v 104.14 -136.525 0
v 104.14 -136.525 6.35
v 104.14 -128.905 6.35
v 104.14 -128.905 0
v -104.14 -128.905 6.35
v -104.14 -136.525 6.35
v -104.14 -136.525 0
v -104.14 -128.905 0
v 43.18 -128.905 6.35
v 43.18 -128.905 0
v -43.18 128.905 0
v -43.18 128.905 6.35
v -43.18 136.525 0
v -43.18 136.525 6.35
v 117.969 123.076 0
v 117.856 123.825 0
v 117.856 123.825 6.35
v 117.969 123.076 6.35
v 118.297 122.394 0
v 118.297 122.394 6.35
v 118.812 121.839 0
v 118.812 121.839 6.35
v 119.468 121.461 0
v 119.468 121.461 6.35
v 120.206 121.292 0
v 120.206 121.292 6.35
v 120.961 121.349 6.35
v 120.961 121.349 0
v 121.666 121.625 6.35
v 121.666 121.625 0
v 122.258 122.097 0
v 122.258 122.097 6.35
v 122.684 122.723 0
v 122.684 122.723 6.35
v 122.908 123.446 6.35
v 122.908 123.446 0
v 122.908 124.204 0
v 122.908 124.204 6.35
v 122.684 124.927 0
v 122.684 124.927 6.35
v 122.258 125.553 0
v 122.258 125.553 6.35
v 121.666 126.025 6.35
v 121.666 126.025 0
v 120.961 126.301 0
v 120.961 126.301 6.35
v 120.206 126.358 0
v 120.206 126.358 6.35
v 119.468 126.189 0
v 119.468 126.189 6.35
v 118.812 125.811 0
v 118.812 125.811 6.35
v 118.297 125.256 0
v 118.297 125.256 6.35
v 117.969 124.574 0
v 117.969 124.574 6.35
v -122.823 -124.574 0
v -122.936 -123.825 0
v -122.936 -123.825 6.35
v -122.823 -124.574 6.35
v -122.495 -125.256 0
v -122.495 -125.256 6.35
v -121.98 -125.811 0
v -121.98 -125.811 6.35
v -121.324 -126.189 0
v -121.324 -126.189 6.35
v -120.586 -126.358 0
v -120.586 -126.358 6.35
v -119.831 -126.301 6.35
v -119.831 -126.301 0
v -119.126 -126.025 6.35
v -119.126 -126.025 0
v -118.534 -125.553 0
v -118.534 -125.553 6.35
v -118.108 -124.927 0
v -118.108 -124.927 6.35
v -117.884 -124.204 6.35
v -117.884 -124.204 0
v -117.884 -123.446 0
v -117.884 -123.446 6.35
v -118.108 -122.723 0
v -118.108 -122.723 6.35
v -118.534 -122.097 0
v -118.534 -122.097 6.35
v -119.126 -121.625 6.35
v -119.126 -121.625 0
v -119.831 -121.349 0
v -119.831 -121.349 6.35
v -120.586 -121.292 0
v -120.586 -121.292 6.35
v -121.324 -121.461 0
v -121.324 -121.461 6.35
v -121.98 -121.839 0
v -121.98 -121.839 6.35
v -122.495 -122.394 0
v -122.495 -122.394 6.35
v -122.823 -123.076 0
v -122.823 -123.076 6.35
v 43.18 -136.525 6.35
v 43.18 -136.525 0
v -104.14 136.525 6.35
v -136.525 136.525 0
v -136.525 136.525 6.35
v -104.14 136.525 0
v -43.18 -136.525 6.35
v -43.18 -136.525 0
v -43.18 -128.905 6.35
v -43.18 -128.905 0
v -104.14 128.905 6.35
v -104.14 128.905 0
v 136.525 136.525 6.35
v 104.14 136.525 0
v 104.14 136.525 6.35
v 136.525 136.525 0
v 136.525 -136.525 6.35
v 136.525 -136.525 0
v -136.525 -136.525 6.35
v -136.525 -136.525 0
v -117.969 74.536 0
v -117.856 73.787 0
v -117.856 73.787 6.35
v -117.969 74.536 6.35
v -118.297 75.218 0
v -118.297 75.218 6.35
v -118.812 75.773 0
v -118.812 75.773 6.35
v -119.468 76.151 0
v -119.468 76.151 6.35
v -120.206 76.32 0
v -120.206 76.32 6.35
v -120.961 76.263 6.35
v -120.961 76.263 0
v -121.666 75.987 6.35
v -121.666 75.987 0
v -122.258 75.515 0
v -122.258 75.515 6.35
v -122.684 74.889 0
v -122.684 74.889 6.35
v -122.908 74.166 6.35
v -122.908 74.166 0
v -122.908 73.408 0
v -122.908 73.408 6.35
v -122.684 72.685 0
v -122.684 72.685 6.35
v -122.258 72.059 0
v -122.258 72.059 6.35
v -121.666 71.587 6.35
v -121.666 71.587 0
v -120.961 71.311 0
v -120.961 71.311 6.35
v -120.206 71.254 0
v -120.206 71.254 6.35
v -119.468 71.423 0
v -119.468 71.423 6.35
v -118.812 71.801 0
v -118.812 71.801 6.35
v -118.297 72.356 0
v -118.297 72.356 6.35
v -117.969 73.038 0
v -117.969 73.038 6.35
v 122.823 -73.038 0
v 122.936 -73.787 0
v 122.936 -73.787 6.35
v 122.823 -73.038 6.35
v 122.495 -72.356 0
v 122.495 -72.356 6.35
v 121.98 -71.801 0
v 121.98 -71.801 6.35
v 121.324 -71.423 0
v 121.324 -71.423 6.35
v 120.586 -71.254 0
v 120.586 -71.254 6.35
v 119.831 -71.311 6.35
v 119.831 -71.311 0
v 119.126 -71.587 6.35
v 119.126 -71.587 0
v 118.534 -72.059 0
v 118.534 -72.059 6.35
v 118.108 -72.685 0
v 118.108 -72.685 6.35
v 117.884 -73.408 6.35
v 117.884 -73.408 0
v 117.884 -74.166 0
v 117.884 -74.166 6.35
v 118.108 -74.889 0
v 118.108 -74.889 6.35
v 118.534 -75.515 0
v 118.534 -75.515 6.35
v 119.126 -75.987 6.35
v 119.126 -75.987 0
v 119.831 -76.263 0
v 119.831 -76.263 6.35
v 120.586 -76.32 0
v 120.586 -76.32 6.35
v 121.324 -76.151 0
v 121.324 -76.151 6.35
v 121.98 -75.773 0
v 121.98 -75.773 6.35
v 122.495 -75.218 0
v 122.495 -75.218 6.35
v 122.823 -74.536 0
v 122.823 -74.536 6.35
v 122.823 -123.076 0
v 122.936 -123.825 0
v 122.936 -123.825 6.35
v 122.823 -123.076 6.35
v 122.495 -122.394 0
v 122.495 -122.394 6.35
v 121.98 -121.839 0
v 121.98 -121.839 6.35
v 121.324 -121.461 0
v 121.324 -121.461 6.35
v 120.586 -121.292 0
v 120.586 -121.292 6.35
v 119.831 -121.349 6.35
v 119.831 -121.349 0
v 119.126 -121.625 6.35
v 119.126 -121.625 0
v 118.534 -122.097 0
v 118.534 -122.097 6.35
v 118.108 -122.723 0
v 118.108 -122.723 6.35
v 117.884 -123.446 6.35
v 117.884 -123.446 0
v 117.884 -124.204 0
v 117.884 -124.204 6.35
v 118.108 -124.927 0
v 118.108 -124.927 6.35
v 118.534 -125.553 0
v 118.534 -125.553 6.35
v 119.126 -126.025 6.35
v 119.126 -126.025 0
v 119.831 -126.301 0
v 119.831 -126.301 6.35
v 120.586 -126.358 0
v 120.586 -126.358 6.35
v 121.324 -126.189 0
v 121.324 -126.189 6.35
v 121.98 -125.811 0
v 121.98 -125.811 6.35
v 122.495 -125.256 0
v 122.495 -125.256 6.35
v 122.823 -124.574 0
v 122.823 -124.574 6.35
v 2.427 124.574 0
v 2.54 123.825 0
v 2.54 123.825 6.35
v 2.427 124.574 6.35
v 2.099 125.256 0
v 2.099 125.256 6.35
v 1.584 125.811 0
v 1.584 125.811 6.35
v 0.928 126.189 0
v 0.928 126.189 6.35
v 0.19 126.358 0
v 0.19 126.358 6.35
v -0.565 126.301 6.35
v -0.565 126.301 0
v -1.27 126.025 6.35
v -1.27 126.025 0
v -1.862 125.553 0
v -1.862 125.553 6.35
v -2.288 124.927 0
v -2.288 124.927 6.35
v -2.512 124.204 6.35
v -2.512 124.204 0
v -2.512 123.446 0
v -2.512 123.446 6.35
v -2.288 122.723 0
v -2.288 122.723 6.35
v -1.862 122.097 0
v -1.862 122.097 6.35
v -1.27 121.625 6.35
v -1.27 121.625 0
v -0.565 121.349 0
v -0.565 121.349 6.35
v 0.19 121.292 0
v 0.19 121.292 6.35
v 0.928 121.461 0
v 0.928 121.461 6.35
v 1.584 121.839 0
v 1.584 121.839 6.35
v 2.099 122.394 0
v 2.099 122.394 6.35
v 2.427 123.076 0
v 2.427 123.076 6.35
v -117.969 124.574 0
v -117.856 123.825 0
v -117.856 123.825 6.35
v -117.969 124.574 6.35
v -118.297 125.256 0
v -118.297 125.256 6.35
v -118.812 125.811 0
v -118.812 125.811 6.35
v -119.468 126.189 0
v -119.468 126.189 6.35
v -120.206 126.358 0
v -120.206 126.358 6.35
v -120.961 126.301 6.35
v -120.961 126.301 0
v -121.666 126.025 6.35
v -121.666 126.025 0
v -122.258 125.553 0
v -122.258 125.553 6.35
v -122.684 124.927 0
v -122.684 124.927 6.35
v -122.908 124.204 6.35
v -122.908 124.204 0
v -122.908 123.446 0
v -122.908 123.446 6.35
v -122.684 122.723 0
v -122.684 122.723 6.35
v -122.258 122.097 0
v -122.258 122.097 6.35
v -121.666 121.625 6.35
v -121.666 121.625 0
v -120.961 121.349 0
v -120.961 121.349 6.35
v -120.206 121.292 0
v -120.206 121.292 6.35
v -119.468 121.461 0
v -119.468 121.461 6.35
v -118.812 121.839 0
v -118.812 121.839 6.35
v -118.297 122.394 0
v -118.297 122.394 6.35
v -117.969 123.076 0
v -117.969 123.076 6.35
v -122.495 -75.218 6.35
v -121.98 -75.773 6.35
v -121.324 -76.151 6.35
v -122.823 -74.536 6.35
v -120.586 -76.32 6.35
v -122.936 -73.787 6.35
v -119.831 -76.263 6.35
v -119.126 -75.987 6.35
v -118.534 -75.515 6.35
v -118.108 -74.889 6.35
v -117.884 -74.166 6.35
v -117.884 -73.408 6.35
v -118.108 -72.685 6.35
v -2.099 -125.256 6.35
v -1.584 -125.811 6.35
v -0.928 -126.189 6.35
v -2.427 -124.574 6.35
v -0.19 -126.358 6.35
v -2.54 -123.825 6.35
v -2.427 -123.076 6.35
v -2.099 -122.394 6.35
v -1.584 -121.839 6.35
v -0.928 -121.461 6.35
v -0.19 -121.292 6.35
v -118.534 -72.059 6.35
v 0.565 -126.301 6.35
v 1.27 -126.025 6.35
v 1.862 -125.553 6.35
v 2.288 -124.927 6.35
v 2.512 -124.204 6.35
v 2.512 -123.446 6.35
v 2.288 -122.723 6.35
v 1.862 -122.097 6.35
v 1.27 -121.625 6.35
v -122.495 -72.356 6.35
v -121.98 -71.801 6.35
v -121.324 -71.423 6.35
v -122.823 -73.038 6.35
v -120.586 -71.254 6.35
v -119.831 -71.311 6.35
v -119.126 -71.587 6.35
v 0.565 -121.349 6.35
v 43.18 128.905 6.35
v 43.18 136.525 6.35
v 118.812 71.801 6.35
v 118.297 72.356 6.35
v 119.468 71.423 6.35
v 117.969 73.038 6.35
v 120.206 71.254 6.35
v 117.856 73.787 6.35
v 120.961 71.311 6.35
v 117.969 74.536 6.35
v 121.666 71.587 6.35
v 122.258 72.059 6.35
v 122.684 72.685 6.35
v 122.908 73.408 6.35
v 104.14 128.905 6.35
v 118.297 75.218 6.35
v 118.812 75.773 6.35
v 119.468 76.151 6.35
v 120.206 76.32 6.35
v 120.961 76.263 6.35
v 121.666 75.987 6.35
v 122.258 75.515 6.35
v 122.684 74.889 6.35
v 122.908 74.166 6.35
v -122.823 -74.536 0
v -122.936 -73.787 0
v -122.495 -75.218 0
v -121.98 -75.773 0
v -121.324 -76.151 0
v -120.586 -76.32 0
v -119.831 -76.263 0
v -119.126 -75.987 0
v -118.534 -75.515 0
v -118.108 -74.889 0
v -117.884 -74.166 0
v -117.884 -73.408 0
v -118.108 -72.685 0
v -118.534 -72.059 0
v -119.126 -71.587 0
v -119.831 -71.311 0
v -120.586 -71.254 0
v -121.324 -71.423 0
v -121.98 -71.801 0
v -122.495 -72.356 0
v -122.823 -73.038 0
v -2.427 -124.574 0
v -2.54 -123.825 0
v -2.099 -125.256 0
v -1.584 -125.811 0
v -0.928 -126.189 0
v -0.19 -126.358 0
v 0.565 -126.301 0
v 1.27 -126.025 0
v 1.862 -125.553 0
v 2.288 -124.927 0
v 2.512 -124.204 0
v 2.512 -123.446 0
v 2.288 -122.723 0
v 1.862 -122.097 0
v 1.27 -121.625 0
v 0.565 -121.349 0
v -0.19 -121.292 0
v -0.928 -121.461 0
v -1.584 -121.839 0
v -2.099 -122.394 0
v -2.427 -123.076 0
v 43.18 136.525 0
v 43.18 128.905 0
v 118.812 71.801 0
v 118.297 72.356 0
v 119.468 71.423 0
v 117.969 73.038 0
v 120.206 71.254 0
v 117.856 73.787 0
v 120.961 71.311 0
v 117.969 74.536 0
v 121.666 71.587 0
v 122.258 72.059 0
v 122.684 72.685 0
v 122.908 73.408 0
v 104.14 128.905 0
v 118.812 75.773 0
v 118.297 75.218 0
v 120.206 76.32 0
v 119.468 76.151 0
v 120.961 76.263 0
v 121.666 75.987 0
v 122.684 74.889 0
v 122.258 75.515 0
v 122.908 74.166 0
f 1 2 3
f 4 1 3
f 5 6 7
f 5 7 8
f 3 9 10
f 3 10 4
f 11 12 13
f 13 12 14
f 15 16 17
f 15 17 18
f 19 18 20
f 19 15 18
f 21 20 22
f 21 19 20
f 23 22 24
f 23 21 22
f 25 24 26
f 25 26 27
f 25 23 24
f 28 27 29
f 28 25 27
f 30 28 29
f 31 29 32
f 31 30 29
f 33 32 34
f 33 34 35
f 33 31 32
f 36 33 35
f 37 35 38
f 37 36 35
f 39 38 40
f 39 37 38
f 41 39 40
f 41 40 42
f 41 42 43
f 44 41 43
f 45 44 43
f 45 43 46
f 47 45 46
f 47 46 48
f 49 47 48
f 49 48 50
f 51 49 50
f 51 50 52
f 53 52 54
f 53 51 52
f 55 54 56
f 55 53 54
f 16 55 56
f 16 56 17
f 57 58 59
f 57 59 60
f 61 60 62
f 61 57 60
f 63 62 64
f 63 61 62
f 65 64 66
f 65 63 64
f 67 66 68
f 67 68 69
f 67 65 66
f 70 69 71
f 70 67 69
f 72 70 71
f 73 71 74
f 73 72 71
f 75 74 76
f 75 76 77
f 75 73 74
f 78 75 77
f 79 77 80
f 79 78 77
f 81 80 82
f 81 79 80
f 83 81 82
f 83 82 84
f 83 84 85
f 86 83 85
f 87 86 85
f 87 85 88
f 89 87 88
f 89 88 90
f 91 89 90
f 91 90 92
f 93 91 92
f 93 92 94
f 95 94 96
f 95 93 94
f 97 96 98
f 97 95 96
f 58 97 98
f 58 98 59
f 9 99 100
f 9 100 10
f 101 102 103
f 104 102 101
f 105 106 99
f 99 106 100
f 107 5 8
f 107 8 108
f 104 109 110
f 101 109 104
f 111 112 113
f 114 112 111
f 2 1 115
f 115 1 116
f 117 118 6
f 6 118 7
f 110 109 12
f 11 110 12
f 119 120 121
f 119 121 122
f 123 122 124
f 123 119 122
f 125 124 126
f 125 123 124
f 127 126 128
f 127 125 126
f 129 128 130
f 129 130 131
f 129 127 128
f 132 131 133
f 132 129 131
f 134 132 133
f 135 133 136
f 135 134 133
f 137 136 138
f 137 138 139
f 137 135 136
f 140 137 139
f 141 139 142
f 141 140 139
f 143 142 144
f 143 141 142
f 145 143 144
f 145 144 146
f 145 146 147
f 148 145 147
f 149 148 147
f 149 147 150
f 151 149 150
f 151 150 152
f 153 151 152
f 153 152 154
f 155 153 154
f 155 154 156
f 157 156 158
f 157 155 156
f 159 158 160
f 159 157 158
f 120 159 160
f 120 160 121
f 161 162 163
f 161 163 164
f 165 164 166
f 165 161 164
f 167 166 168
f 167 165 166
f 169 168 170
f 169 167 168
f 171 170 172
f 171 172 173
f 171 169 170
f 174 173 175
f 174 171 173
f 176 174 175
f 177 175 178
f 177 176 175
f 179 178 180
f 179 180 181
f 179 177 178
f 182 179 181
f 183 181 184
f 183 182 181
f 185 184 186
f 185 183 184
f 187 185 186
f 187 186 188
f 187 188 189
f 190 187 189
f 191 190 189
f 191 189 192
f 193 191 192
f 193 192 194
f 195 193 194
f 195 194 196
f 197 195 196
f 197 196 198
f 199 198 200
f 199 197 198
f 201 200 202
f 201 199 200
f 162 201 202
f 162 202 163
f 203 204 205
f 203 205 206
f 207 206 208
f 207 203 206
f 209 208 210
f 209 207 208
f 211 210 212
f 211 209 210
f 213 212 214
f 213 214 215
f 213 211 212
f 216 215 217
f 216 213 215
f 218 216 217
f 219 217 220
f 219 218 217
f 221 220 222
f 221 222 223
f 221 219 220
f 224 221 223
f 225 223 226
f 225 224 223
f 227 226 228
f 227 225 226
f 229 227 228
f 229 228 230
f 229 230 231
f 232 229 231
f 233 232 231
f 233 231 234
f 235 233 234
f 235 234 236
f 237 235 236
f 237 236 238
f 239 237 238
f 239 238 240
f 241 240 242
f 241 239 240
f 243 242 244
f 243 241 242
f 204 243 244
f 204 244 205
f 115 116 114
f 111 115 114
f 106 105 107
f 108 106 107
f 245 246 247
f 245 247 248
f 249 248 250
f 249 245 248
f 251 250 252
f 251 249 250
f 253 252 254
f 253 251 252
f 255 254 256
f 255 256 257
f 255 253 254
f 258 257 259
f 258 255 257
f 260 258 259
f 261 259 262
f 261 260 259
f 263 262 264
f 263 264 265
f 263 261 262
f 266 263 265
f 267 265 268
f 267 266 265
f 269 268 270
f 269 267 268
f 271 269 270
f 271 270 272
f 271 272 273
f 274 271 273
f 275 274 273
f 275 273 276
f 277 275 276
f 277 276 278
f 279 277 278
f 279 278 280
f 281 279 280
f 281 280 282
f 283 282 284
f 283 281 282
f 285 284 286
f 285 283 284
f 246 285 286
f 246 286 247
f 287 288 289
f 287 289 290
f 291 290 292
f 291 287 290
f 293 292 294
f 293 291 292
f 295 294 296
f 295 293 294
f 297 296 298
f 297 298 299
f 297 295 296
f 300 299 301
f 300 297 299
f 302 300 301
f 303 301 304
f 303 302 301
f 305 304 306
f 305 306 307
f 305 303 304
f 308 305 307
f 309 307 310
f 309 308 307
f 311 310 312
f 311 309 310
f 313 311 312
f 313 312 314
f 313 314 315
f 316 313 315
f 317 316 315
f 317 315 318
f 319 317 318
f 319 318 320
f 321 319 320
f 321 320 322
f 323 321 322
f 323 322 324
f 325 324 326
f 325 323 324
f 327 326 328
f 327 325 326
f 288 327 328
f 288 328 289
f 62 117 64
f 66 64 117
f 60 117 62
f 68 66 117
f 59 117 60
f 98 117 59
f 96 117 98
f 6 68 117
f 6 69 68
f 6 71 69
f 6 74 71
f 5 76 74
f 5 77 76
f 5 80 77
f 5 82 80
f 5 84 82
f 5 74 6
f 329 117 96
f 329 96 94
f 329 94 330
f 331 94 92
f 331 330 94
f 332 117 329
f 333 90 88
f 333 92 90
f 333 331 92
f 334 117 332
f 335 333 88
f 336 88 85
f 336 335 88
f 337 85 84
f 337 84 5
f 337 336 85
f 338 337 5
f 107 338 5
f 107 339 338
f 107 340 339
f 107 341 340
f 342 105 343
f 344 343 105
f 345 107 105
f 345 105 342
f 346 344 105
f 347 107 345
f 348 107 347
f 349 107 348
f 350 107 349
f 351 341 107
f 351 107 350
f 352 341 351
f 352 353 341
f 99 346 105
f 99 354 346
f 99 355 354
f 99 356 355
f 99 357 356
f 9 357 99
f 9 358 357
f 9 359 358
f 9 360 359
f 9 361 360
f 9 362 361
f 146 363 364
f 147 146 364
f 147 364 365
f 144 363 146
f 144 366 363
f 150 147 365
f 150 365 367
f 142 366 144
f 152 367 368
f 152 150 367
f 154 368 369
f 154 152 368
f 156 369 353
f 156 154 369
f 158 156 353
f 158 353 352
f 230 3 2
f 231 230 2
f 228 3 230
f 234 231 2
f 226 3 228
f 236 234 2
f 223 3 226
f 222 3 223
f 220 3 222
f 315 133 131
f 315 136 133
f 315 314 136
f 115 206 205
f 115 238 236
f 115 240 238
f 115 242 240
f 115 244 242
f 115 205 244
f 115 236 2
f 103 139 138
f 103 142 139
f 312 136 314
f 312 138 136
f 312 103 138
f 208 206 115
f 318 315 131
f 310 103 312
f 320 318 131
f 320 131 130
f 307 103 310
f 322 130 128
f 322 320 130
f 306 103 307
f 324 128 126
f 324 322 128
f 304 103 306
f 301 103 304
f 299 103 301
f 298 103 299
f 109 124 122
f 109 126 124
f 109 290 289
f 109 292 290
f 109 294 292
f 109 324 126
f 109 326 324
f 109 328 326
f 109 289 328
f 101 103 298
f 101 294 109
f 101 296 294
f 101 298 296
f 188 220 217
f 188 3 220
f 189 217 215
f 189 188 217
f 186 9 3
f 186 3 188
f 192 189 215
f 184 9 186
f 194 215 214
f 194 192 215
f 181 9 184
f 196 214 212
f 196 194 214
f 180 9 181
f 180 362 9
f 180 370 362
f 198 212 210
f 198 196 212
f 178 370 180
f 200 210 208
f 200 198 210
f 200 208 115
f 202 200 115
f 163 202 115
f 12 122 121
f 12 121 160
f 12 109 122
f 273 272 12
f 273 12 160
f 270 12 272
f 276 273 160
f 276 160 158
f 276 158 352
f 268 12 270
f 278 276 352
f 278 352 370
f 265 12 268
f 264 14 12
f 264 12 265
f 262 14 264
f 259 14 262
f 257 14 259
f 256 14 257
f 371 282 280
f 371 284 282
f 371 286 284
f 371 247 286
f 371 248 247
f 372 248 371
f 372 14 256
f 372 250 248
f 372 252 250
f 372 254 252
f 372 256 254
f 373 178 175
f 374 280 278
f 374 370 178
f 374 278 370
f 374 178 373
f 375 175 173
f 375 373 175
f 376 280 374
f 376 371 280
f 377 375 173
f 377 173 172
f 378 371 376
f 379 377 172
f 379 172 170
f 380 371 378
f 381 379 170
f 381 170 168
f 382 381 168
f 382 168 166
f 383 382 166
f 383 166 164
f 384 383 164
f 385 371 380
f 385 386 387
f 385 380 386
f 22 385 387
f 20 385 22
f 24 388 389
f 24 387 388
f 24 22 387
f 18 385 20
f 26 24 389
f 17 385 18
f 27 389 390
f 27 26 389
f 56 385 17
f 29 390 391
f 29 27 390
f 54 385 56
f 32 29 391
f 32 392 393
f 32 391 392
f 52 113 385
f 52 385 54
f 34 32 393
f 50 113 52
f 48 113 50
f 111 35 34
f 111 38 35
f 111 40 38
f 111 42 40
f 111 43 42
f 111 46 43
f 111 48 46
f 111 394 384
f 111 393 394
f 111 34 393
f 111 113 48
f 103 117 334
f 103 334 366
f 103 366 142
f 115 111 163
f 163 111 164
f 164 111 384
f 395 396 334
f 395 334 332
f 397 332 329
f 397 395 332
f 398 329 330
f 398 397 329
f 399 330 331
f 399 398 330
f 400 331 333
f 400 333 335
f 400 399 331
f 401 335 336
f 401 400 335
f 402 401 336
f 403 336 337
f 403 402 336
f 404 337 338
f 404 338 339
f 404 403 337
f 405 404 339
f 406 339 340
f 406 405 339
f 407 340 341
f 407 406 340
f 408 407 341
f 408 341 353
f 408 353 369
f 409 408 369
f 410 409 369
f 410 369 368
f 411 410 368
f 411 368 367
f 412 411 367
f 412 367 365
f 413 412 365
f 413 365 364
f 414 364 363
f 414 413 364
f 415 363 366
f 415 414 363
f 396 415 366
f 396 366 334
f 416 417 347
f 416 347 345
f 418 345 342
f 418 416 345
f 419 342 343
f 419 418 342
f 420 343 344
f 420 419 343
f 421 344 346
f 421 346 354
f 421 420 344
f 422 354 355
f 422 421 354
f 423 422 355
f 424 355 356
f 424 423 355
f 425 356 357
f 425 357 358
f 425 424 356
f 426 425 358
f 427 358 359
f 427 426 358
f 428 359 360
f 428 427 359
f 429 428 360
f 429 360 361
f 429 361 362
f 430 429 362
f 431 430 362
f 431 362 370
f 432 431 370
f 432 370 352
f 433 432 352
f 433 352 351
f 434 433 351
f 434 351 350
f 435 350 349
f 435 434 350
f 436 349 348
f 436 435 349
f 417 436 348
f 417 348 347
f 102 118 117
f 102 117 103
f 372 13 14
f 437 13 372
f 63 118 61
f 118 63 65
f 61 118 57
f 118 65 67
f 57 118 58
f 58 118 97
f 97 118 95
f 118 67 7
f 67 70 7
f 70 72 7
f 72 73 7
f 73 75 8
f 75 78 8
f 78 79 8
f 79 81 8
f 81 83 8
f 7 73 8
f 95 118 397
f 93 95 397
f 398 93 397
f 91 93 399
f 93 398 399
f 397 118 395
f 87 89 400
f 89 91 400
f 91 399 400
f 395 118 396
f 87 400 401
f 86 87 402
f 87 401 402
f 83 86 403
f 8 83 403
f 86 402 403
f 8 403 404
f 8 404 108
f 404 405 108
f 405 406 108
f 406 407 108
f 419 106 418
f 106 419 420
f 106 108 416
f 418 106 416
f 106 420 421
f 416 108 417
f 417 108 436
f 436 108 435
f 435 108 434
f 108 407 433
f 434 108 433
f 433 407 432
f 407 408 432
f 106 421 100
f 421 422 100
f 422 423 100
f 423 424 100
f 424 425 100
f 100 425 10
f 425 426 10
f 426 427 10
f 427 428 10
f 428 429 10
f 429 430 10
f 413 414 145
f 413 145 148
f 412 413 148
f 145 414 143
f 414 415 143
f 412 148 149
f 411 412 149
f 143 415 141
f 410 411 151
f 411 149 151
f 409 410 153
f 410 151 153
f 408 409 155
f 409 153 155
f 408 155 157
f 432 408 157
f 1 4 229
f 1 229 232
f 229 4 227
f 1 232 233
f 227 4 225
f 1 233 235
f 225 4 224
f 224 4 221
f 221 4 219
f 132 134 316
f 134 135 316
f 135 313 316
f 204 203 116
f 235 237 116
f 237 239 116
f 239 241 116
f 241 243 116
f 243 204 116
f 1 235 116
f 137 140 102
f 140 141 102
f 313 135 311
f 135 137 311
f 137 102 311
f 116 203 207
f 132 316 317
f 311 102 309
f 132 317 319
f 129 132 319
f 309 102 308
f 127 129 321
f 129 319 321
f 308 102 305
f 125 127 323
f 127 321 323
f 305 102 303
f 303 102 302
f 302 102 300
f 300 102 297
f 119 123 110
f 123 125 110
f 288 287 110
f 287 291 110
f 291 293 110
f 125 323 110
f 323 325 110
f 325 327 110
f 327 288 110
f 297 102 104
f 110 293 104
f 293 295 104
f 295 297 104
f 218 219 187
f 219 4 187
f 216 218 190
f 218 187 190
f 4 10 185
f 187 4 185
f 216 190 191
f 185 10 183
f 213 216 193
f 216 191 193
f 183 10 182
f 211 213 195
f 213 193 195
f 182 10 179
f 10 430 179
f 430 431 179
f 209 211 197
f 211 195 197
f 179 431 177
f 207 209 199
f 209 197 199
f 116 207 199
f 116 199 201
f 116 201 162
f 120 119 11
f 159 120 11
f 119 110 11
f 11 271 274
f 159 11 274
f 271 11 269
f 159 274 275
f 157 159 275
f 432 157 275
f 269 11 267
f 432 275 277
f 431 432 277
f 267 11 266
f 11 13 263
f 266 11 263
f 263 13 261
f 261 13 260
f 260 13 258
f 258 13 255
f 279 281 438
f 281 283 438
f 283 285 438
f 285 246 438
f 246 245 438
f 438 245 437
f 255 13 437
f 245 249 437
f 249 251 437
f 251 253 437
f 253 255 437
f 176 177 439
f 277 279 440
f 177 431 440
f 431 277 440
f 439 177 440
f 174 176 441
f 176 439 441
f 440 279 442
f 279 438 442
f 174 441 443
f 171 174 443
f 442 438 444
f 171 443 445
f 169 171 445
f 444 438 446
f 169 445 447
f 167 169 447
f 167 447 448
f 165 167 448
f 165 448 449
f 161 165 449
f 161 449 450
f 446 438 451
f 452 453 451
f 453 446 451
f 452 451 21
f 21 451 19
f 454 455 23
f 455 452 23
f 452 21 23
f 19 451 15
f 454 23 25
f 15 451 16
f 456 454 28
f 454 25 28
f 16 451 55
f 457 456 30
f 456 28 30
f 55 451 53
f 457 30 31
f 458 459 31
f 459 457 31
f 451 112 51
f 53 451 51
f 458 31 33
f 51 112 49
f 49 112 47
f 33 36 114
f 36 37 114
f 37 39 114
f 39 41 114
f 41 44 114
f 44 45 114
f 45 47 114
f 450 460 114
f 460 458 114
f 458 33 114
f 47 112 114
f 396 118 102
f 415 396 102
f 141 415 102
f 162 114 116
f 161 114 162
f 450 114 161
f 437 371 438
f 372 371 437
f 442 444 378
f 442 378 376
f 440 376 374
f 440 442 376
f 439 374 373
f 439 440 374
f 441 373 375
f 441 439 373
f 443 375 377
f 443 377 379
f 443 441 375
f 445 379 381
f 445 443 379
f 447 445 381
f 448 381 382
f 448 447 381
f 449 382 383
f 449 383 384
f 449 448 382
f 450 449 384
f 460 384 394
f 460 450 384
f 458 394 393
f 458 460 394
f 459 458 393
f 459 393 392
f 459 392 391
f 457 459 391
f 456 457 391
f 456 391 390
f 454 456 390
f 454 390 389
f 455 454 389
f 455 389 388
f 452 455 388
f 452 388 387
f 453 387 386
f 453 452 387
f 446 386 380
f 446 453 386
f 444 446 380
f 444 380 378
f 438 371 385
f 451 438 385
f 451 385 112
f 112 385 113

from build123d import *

# Parameters (mm, degrees)
SKETCH2_W           = 273.05
SKETCH2_H           = 273.05
SKETCH2_R           = 2.54
BOSS_EXTRUDE1_DEPTH = 6.35
SKETCH3_W           = 60.96
SKETCH3_H           = 17.280059867
CUT_EXTRUDE1_DEPTH  = 194.179899964


with BuildPart() as part:
    # Sketch2 → Boss-Extrude1 (new body)
    with BuildSketch(Plane.XY):
        Rectangle(SKETCH2_W, SKETCH2_H)
        with Locations((-120.396, 123.825)):
            Circle(SKETCH2_R, mode=Mode.SUBTRACT)
        with Locations((-120.396, 73.787)):
            Circle(SKETCH2_R, mode=Mode.SUBTRACT)
        with Locations((0, 123.825)):
            Circle(SKETCH2_R, mode=Mode.SUBTRACT)
        with Locations(Location((120.396, 73.787, 0), (0, 0, 180))):
            Circle(SKETCH2_R, mode=Mode.SUBTRACT)
        with Locations(Location((120.396, 123.825, 0), (0, 0, 180))):
            Circle(SKETCH2_R, mode=Mode.SUBTRACT)
        with Locations((120.396, -123.825)):
            Circle(SKETCH2_R, mode=Mode.SUBTRACT)
        with Locations((120.396, -73.787)):
            Circle(SKETCH2_R, mode=Mode.SUBTRACT)
        with Locations(Location((0, -123.825, 0), (0, 0, 180))):
            Circle(SKETCH2_R, mode=Mode.SUBTRACT)
        with Locations(Location((-120.396, -73.787, 0), (0, 0, 180))):
            Circle(SKETCH2_R, mode=Mode.SUBTRACT)
        with Locations(Location((-120.396, -123.825, 0), (0, 0, 180))):
            Circle(SKETCH2_R, mode=Mode.SUBTRACT)
    extrude(amount=BOSS_EXTRUDE1_DEPTH)

    # Sketch3 → Cut-Extrude1 (cut, through all)
    with BuildSketch(Plane.XY.offset(6.35)):
        with Locations((73.66, 137.545029934)):
            Rectangle(SKETCH3_W, SKETCH3_H)
        with Locations((-73.66, 137.545029934)):
            Rectangle(SKETCH3_W, SKETCH3_H)
        with Locations((-73.66, -137.545029934)):
            Rectangle(SKETCH3_W, SKETCH3_H)
        with Locations((73.66, -137.545029934)):
            Rectangle(SKETCH3_W, SKETCH3_H)
    extrude(amount=-CUT_EXTRUDE1_DEPTH, mode=Mode.SUBTRACT)


solid = part.part
